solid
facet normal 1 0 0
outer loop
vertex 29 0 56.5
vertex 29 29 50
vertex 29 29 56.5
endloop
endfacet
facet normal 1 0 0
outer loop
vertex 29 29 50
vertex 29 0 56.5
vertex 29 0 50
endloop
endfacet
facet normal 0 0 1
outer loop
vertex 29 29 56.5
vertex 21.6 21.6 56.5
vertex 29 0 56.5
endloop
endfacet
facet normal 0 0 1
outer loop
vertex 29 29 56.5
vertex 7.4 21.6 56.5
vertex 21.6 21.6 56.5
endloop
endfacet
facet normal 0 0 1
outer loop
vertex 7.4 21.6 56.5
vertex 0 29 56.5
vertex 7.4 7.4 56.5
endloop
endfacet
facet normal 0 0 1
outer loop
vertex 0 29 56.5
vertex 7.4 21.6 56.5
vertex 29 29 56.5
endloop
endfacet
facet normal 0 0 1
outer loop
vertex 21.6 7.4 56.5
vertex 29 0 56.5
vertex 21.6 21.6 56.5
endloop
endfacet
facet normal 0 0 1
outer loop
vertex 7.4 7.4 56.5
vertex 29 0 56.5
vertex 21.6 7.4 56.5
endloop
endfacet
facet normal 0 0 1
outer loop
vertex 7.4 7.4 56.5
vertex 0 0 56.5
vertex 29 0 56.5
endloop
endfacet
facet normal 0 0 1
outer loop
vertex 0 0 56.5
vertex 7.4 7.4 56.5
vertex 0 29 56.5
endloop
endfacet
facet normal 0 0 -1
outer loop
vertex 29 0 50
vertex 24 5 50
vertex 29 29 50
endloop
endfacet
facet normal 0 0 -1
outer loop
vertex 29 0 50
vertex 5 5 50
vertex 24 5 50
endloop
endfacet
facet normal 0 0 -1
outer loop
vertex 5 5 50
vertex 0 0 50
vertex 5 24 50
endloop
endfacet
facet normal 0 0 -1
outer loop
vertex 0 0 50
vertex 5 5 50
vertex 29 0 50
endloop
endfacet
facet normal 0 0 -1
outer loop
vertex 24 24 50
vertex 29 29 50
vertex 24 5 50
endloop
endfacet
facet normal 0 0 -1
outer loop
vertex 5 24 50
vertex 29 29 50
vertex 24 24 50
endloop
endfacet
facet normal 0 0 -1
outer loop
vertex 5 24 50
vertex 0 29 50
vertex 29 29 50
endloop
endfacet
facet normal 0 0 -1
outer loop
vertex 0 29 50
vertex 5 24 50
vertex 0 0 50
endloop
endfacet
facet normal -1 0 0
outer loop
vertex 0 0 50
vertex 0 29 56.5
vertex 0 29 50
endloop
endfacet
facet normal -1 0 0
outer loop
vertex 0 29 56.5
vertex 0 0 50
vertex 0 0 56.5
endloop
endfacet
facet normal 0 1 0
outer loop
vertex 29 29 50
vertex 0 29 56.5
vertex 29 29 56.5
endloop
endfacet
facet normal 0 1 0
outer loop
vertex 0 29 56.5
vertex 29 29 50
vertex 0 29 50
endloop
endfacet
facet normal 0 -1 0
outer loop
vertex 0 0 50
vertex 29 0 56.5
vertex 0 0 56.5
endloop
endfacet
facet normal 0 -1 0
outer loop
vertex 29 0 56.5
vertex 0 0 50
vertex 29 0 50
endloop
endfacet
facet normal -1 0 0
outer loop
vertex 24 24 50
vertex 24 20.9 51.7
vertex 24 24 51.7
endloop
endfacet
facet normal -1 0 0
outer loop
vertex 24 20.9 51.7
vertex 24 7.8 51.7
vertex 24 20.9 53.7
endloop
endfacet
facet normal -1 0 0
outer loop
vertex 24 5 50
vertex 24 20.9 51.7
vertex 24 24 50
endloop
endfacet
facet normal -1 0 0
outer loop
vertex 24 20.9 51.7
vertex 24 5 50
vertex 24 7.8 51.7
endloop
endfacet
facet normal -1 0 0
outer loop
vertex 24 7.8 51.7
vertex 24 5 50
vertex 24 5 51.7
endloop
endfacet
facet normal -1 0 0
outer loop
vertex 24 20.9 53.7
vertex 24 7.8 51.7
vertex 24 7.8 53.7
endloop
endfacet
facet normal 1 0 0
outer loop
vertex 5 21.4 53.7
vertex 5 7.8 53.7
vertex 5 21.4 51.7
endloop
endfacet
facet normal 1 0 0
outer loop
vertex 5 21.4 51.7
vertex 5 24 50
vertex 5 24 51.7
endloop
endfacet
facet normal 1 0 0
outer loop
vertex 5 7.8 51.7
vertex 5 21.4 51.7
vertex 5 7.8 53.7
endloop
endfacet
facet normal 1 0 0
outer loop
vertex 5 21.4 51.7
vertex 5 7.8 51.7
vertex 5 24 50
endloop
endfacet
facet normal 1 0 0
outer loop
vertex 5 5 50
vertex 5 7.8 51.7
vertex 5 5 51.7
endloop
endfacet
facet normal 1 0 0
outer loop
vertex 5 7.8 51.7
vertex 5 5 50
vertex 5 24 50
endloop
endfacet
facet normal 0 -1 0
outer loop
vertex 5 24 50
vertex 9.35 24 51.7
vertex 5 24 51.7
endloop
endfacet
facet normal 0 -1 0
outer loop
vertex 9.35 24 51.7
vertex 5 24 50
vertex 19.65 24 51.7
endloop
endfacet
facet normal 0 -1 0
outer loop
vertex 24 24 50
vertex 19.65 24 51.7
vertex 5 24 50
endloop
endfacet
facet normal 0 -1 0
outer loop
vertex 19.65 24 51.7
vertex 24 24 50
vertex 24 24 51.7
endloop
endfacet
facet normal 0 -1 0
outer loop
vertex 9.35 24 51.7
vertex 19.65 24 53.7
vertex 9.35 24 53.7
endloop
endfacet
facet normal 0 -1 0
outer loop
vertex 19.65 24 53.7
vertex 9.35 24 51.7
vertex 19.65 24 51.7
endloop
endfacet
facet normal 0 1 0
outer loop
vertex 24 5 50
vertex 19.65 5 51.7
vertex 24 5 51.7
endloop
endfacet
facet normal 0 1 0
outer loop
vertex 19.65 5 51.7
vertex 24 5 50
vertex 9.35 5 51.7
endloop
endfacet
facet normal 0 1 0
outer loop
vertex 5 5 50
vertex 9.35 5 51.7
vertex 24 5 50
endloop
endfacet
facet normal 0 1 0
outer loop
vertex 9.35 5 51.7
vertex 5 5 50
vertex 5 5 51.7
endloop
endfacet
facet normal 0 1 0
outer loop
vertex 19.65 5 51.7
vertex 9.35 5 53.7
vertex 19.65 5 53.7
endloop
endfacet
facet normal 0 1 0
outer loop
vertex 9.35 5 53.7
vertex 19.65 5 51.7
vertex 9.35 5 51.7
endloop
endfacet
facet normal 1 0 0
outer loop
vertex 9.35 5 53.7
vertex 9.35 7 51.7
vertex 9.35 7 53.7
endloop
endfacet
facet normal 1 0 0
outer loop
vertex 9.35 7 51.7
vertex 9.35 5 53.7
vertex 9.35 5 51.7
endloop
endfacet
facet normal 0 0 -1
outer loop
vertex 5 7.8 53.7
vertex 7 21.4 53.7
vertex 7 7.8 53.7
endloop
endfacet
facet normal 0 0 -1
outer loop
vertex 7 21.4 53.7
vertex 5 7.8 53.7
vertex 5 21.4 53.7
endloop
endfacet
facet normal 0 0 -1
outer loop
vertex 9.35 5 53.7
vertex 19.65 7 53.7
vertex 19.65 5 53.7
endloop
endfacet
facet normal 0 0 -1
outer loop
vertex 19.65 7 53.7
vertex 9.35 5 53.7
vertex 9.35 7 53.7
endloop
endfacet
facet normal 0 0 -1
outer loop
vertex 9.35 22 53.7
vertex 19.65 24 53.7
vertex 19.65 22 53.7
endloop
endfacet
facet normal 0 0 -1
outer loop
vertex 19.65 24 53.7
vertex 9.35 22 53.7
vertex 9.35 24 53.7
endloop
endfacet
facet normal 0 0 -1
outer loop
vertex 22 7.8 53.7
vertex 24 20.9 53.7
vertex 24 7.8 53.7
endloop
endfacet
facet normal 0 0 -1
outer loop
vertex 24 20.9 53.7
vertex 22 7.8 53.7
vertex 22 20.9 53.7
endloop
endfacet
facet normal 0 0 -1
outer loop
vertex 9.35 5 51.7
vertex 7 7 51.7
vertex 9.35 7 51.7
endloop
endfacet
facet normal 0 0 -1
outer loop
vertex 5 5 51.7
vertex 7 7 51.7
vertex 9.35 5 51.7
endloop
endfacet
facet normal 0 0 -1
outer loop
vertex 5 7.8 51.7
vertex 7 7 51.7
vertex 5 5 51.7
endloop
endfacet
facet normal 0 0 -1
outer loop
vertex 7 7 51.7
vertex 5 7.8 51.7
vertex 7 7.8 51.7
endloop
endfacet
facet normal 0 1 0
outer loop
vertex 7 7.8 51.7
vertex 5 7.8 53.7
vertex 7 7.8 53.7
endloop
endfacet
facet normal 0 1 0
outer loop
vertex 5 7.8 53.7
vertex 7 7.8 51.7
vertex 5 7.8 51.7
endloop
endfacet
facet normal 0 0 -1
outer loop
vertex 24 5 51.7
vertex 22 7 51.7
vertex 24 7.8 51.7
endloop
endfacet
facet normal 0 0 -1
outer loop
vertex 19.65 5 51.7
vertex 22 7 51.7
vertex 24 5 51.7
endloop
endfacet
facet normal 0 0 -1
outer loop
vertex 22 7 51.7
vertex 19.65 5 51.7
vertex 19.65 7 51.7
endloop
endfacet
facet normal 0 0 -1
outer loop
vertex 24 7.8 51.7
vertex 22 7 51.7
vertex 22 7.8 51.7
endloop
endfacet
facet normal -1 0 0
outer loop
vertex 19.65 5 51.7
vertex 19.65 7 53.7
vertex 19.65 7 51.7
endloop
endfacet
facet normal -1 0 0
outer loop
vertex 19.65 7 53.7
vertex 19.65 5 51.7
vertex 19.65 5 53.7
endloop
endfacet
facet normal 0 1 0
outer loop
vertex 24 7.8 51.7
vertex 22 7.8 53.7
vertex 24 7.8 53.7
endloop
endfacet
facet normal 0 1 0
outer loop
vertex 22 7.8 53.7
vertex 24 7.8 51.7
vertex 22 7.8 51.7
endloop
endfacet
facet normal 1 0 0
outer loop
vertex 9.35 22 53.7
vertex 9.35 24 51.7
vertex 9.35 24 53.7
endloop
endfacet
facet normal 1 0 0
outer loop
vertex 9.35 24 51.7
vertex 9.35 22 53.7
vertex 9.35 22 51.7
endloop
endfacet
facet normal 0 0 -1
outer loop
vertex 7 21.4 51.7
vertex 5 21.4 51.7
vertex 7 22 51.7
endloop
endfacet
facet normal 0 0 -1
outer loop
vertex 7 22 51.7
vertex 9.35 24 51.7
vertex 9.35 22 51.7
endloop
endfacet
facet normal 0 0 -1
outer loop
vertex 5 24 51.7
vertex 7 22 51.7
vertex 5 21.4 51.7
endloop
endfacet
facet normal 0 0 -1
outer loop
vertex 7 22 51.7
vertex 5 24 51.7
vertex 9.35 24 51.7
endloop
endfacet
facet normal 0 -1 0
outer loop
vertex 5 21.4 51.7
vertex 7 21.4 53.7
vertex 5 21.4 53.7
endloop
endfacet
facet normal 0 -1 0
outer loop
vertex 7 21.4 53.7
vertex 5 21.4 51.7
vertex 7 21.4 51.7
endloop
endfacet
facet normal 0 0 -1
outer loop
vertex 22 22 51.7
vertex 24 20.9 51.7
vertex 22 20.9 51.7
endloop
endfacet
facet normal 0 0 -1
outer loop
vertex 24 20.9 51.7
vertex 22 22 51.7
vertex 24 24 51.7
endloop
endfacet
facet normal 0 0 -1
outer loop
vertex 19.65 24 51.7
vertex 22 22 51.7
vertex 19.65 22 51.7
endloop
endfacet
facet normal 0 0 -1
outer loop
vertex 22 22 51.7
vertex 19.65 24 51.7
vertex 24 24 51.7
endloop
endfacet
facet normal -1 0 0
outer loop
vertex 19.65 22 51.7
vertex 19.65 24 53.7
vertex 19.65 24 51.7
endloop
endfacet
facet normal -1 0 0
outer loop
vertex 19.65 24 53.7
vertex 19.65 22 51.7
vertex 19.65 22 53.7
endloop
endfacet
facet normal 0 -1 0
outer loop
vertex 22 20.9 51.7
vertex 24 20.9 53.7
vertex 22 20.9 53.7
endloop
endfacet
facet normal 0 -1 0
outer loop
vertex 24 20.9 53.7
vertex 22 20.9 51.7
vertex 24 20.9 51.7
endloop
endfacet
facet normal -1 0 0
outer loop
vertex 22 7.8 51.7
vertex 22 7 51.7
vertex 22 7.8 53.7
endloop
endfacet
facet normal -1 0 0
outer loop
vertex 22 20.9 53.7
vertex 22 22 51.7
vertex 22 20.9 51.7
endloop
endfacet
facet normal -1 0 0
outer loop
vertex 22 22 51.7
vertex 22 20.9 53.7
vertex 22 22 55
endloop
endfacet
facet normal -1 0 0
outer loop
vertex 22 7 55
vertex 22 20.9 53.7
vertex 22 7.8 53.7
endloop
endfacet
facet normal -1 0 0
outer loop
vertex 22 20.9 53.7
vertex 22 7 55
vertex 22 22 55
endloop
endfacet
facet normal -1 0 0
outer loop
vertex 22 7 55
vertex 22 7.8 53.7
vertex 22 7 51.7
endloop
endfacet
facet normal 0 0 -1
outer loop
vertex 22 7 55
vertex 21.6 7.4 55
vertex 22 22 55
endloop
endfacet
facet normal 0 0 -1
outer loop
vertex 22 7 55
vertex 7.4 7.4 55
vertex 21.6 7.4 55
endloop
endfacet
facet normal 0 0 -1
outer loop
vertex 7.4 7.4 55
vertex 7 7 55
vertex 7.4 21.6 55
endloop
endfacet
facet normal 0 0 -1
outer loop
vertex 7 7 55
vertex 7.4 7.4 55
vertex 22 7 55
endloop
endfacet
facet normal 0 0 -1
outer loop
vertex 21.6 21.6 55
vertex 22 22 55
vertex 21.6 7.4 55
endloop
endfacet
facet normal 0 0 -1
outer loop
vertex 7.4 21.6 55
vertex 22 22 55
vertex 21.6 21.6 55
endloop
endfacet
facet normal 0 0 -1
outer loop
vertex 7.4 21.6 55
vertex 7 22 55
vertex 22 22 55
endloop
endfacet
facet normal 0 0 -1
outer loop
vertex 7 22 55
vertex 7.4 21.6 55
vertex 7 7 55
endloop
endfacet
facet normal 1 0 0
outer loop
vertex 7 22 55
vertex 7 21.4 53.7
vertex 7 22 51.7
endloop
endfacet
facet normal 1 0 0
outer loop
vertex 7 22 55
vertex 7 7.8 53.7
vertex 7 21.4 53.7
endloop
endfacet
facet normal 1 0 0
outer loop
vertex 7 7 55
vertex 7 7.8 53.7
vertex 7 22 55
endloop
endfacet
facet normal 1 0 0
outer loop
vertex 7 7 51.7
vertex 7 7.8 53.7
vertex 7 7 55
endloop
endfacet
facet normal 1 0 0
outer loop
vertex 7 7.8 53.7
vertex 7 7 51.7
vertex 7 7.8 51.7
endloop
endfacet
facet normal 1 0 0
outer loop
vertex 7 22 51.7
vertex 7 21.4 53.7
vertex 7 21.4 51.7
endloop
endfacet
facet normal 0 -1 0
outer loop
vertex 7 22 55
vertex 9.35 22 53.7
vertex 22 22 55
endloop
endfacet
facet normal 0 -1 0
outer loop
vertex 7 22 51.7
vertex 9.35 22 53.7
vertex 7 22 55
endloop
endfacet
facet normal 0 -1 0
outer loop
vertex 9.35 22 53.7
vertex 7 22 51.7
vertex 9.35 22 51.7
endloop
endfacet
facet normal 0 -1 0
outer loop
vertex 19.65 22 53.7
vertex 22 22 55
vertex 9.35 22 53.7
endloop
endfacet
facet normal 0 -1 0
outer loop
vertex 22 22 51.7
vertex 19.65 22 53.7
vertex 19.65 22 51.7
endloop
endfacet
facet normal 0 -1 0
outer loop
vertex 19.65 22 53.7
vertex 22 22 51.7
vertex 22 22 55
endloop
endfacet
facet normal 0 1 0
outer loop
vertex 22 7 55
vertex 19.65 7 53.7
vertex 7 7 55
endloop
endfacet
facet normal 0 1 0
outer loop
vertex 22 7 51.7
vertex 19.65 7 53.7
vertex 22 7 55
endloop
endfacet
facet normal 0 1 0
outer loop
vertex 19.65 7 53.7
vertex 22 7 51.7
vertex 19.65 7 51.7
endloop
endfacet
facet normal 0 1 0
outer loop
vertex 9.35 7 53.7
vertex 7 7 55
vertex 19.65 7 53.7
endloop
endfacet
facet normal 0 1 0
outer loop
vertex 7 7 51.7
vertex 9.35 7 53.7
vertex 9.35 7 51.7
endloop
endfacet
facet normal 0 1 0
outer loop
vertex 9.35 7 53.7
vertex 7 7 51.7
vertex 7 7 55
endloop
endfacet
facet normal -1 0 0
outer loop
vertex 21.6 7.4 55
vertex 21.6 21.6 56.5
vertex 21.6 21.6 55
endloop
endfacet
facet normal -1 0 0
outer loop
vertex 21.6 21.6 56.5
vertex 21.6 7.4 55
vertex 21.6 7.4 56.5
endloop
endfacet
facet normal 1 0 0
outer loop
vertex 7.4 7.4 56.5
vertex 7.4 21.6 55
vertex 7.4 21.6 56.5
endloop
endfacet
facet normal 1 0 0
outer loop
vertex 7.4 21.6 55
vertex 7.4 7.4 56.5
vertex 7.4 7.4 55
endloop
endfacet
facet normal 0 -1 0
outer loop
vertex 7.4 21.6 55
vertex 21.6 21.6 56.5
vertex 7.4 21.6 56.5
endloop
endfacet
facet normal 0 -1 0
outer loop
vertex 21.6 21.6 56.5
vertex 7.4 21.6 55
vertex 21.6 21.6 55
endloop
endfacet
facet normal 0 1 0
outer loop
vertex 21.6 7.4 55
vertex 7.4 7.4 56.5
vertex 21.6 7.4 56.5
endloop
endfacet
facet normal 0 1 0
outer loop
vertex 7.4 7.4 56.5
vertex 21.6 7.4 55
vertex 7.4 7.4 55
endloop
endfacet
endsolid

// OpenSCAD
// file: key_definitions.scad
/*
 * Standard 1u keycap size
 *  Keycap placeholder space: 19.05 x 19.05mm
 *  Keycap size: 18 x 18mm
 *  Plate switch hole: 14 x 14mm
 *  Distance between switch holes: 5.05mm
 */

U1 = 18; /* Default */
U125 = U1 * 1.25; /* 22.5, Modifier */
U15 = U1 * 1.50;  /* 27.0, Modifier, Tab, '\|'' */
U175 = U1 * 1.75; /* 31.5, Caps Lock */
U2 = U1 * 2.00;   /* 36.0, Num Plus, Num Enter, Backspace */
U225 = U1 * 2.25; /* 40.5, Left Shift */
U275 = U1 * 2.75; /* 49.5, Right Shift */
U625 = U1 * 6.25; /* 112.5, Space */
// main file
include <key_definitions.scad>
use <key_support.scad>

$fn = 30;

KEYS = [
    [U1]
];

border = 5;
width = 19 + (border * 2);

DrawTopPlate = 1;
DrawKeyboardBody = 0;
DrawBottomPlate = 0;
DrawProto = 0;

if (DrawTopPlate) {
    translate([0, 0, 50])
            KeyboardTopPlate(border, width, KEYS);
}

if (DrawKeyboardBody) {
    translate([0, 0, 20])
            KeyboardBody(border, width, KEYS);
}

if (DrawBottomPlate) {
    translate([0, 0, -getBottomPlateDepth()])
            KeyboardBottomPlate(border, width, KEYS);
}

if (DrawProto) {
    translate([0, 0, 5])
            KeyboardProto(border, width, KEYS);
}
